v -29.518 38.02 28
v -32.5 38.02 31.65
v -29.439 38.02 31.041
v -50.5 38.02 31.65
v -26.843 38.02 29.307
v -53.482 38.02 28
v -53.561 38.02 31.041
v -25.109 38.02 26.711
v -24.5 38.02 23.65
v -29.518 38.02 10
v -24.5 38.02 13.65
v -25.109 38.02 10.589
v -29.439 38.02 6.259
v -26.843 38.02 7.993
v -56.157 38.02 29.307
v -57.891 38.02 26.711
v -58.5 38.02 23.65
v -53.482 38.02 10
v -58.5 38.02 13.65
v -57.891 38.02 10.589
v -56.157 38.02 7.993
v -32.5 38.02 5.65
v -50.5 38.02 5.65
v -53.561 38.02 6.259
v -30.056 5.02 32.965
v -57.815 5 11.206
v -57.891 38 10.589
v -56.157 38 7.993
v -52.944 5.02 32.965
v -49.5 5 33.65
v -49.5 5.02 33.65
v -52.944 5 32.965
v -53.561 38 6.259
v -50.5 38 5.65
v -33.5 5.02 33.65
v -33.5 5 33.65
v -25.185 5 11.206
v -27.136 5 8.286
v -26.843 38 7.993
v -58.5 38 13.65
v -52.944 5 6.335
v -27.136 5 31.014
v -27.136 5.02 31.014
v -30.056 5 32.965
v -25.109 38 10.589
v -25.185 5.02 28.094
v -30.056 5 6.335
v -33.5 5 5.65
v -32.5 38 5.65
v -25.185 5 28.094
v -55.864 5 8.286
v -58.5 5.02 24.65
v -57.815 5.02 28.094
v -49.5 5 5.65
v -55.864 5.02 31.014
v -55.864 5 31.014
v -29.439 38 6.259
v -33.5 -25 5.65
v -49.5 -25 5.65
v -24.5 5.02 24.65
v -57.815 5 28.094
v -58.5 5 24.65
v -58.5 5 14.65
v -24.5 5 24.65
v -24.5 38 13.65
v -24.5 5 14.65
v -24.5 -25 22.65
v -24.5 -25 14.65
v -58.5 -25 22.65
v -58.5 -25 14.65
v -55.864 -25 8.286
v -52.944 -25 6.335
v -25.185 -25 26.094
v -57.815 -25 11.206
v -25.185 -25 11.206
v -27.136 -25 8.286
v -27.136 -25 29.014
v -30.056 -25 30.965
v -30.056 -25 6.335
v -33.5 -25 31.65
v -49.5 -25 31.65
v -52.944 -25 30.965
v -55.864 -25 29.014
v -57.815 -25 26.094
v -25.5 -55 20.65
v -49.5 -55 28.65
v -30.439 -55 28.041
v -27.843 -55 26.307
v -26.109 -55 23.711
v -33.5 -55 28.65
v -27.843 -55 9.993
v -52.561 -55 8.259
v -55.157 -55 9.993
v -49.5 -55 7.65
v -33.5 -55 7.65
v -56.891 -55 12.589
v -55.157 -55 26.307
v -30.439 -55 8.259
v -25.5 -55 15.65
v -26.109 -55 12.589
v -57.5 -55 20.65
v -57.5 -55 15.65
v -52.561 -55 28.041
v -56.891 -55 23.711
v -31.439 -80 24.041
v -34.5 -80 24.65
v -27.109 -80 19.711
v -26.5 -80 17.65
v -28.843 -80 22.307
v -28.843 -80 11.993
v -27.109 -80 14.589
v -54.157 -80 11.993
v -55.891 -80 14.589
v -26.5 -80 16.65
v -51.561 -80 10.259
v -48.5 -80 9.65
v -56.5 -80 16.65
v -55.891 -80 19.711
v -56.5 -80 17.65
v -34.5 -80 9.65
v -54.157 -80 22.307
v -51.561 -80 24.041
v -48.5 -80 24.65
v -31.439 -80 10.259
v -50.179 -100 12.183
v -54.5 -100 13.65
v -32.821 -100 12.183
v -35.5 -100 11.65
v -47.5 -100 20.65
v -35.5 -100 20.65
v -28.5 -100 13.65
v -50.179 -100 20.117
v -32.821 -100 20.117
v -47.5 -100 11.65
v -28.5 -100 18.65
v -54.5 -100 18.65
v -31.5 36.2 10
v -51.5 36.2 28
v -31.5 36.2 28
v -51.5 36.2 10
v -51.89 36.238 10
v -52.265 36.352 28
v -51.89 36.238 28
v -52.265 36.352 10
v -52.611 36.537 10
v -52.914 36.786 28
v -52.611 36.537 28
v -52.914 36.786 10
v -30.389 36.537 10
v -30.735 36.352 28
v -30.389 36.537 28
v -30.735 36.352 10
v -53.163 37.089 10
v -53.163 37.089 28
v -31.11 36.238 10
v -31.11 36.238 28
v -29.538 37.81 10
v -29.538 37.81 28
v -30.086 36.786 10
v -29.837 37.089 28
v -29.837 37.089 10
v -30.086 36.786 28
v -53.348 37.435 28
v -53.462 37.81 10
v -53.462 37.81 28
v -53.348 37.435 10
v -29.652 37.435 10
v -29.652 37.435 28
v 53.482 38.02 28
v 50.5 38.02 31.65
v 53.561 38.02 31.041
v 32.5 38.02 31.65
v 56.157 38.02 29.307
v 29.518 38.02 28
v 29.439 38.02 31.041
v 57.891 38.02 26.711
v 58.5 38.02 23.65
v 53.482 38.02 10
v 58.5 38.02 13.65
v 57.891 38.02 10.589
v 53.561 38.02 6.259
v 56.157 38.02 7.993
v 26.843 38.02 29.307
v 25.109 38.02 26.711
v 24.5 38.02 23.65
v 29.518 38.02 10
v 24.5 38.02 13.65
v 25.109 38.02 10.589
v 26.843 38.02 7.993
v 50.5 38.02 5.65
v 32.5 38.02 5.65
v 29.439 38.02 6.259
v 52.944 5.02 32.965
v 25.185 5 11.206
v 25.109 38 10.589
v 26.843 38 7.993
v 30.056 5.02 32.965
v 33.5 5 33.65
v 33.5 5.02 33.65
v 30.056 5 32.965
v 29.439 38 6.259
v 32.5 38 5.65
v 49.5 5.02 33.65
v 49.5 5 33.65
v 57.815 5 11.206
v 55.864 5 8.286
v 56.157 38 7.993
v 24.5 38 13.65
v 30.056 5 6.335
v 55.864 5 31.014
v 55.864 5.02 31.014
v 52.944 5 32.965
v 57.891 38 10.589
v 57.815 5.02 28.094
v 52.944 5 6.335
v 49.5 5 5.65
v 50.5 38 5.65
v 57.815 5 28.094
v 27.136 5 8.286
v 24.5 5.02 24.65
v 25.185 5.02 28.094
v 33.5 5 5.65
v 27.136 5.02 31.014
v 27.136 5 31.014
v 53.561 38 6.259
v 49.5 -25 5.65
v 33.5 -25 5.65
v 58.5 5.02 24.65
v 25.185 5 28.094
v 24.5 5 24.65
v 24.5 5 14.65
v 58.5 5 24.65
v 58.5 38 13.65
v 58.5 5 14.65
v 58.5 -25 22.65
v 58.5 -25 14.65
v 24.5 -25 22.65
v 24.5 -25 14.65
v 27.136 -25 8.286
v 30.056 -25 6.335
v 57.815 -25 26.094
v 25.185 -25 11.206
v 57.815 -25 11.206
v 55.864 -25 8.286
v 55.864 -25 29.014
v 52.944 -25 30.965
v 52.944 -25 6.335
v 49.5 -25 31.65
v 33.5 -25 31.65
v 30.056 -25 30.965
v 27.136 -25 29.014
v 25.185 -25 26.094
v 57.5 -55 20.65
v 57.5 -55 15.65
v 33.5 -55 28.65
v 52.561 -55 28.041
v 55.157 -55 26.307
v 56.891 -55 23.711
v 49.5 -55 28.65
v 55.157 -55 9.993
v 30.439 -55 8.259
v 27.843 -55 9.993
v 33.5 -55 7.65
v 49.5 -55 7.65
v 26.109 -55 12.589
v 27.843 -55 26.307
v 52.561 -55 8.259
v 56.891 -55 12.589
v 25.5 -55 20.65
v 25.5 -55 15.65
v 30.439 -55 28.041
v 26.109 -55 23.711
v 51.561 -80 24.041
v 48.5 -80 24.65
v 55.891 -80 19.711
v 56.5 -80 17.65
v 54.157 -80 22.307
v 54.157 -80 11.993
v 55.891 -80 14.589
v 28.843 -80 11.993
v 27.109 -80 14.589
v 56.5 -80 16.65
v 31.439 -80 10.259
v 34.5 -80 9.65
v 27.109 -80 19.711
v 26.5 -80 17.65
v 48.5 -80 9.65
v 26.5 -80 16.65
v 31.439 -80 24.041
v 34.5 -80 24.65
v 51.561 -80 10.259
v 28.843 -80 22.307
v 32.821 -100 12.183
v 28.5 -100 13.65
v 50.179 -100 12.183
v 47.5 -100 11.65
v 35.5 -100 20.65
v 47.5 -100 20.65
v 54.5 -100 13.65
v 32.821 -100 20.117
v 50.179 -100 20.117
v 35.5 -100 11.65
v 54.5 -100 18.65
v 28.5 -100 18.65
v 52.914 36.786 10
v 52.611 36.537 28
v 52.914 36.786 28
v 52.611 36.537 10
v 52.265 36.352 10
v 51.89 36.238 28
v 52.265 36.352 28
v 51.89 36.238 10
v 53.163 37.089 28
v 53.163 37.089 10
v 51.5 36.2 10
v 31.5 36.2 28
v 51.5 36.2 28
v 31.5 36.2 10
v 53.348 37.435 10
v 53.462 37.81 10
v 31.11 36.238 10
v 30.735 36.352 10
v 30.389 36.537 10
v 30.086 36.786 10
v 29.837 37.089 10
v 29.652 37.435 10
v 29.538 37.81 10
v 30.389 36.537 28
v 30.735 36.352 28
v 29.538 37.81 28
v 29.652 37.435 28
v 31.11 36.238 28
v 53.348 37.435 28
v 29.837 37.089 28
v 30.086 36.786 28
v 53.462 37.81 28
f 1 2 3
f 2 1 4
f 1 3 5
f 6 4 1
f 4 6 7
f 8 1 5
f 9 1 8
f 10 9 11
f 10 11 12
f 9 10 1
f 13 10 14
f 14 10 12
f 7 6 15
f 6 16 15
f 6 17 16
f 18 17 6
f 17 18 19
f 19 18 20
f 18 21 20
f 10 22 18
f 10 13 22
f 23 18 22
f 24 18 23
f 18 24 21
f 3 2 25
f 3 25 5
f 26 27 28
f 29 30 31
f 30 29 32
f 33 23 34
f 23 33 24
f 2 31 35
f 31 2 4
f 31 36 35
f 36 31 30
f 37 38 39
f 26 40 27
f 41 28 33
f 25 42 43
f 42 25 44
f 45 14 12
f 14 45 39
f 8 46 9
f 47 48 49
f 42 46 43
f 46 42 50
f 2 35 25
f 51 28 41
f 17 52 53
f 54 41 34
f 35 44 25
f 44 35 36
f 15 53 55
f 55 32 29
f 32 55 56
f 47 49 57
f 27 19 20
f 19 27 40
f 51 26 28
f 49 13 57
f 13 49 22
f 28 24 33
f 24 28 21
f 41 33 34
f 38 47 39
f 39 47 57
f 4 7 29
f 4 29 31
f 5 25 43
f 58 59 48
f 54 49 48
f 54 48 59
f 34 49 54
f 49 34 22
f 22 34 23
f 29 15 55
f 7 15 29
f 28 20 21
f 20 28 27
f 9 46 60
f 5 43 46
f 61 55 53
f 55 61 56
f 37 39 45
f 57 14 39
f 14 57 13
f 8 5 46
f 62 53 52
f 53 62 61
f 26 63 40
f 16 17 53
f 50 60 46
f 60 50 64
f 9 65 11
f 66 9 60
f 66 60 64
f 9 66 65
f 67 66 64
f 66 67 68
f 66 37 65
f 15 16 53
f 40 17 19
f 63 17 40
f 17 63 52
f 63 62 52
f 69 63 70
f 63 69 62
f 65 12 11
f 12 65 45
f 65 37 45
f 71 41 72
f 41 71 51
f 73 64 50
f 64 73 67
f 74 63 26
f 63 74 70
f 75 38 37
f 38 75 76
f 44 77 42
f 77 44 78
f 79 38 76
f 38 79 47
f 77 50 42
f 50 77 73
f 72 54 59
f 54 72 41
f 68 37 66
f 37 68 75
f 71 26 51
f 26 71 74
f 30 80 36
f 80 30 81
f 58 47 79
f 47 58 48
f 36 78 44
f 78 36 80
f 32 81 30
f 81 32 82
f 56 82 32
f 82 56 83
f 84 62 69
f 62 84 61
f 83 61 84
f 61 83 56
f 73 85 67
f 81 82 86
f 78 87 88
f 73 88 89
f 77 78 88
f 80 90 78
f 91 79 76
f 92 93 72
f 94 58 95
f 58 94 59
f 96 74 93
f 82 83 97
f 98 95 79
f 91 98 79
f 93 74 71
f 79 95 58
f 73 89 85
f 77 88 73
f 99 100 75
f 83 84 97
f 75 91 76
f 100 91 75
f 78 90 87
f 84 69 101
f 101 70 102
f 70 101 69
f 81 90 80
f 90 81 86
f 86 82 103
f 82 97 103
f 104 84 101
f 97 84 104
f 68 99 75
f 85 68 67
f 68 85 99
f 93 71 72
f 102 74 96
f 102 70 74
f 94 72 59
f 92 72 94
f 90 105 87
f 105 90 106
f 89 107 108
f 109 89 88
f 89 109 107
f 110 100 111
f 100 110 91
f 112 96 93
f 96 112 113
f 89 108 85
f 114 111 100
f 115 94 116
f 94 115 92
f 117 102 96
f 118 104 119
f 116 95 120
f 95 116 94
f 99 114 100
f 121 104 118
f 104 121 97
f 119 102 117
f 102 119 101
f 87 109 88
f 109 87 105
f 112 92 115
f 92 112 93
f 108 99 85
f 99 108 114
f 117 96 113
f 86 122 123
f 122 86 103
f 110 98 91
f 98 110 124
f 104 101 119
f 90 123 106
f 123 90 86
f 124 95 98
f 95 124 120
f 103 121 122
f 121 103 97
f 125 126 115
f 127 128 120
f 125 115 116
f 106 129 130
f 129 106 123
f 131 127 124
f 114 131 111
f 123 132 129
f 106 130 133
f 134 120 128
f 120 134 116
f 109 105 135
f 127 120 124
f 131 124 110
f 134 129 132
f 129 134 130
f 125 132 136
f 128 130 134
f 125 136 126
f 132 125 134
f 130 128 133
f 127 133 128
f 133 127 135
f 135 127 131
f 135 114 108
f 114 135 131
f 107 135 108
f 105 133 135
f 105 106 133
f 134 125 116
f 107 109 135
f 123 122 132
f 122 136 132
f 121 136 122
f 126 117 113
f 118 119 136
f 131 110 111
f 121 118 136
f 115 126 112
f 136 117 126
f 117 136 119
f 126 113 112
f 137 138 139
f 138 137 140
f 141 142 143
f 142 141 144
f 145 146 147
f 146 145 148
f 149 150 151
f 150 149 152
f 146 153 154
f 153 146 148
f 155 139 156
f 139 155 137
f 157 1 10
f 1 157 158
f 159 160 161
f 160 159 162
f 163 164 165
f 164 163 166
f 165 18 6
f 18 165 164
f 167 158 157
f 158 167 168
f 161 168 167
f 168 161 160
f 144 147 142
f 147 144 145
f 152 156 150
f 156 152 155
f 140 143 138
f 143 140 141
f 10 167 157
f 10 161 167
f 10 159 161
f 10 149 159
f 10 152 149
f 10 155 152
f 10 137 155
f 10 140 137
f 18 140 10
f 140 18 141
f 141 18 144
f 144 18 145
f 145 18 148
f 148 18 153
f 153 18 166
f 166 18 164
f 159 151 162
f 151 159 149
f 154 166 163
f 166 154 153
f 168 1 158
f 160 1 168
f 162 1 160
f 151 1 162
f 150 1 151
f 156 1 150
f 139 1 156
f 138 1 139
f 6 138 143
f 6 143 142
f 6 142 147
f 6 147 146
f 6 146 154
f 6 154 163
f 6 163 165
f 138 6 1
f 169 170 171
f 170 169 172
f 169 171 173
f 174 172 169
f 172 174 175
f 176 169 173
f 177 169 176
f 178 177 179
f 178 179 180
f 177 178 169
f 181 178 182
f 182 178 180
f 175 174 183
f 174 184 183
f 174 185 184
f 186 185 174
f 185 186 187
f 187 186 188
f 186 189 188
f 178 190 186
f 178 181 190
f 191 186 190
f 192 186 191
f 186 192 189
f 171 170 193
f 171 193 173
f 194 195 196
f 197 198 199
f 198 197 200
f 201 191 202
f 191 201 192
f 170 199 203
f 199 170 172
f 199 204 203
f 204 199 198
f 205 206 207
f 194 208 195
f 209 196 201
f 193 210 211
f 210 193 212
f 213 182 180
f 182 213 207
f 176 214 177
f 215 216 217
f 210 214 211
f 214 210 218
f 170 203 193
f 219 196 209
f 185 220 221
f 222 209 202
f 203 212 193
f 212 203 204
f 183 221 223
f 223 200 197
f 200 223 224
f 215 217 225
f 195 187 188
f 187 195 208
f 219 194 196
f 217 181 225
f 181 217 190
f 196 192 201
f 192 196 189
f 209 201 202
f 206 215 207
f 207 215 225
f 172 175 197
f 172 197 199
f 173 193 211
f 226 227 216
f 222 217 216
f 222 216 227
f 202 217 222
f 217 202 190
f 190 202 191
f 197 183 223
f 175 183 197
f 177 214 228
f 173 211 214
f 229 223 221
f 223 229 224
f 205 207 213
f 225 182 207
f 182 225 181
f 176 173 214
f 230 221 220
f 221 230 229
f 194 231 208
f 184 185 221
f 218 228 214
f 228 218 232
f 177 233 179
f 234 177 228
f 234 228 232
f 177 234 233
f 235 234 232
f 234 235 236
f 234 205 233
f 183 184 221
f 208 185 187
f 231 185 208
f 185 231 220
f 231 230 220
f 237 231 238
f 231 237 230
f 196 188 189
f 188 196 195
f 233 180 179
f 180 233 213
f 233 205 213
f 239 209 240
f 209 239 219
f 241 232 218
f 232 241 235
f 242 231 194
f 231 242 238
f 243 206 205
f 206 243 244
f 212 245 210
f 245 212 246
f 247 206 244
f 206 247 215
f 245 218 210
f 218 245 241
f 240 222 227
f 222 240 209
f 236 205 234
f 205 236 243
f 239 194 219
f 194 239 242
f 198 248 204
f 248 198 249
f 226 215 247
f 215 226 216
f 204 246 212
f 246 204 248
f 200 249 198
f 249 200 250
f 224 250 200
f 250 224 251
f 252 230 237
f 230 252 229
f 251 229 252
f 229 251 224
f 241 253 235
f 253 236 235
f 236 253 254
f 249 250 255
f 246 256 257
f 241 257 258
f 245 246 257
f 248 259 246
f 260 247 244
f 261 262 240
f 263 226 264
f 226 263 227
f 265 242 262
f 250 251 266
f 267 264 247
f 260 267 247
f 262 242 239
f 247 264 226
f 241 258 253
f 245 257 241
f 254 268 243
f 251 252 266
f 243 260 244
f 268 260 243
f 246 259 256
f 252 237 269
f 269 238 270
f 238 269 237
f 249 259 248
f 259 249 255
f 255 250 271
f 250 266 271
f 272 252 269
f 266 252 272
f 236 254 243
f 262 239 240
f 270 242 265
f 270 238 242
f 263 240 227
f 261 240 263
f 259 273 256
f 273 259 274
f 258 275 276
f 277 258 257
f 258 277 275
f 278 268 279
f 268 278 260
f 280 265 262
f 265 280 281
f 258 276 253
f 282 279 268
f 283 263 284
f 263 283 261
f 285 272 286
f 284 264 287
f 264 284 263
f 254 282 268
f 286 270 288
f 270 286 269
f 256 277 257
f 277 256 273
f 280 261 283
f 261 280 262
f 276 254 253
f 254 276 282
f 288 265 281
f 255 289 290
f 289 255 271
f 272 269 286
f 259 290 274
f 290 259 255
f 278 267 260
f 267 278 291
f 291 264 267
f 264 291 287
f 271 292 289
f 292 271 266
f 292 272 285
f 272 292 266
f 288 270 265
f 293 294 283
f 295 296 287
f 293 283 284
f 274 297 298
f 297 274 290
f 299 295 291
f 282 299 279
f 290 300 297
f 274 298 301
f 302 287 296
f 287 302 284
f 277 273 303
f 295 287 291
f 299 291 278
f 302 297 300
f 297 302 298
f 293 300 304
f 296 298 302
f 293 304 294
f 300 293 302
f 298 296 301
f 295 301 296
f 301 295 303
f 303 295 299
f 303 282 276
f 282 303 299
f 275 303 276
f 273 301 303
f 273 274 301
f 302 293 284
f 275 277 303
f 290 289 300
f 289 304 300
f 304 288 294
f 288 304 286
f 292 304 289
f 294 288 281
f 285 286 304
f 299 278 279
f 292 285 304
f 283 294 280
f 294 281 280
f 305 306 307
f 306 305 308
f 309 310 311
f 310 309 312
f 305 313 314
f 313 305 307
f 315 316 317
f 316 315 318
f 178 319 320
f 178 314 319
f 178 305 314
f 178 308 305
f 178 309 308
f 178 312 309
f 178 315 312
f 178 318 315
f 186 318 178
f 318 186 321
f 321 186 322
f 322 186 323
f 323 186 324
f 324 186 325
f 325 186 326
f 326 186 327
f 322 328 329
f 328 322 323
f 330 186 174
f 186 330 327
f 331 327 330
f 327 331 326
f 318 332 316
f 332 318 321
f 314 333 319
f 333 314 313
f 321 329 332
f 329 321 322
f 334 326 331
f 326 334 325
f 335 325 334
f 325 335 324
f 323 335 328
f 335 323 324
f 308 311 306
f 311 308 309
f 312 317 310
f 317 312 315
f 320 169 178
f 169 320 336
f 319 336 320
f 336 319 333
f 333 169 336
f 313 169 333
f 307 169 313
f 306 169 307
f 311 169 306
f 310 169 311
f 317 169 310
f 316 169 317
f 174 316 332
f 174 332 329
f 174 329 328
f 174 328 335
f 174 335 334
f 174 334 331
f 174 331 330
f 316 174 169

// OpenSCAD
// file: ../lib.scad
// ===== 공용 프리미티브 (params 의존 없음 — use로 포함. 함정 1) =====

// 두 점을 잇는 캡슐. 끝단이 od/2 만큼 뻗는다 (함정 3)
module rod(p1, p2, od, fn = 56)
    hull() { translate(p1) sphere(d = od, $fn = fn);
             translate(p2) sphere(d = od, $fn = fn); }

function mir(p, s = 1) = [s * p.x, p.y, p.z];

// --- 라운디드 사각 2D 폴리곤 (CCW) ---
function arc_pt(cx, cy, r, a) = [cx + r * cos(a), cy + r * sin(a)];
function rrpts(w, h, r, n = 4) =
    let (x = w / 2 - r, y = h / 2 - r)
    concat(
        [for (i = [0:n]) arc_pt( x, -y, r, -90 + 90 * i / n)],
        [for (i = [0:n]) arc_pt( x,  y, r,   0 + 90 * i / n)],
        [for (i = [0:n]) arc_pt(-x,  y, r,  90 + 90 * i / n)],
        [for (i = [0:n]) arc_pt(-x, -y, r, 180 + 90 * i / n)]);

// y 위치의 XZ 단면 슬래브 (중심 x0/zc, 폭 w/높이 h, 모서리 r).
// 회전 매핑: 2D x→차량 X, 2D y→차량 Z, 돌출 +z→−Y (y..y+0.02 전방 전용, 함정 20)
module slabr(y, x0, w, h, zc, r)
    translate([x0, y + 0.02, zc]) rotate([90, 0, 0])
        linear_extrude(0.02) polygon(rrpts(w, h, r));

// 단면 체인 loft: sec = [[y, x0, w, h, zc, r], ...]
module loftr(sec)
    for (i = [0 : len(sec) - 2])
        hull() {
            slabr(sec[i][0],     sec[i][1],     sec[i][2],     sec[i][3],     sec[i][4],     sec[i][5]);
            slabr(sec[i + 1][0], sec[i + 1][1], sec[i + 1][2], sec[i + 1][3], sec[i + 1][4], sec[i + 1][5]);
        }

// 라운디드 박스 (z0..z1 수직, 평면 모서리 r)
module rbox(xc, yc, z0, z1, dx, dy, r, fn = 32)
    hull() for (px = [-1, 1], py = [-1, 1])
        translate([xc + px * (dx / 2 - r), yc + py * (dy / 2 - r), z0])
            cylinder(r = r, h = z1 - z0, $fn = fn);

// --- NACA 계열 에어포일 (LE 원점, 2D +x = 현 방향) ---
function _yt(x, c, t) = 5 * t * c * (0.2969*sqrt(x) - 0.1260*x - 0.3516*x*x
    + 0.2843*x*x*x - 0.1036*x*x*x*x);
function _yc(x, c, m) = 4 * m * c * x * (1 - x);
function naca_pts(c, t, m, n = 12) =
    concat(
        [for (i = [0:n])     let (x = i / n)     [x*c,  _yt(x, c, t) + _yc(x, c, m)]],
        [for (i = [n-1:-1:0]) let (x = i / n)    [x*c, -_yt(x, c, t) + _yc(x, c, m)]]);

// 슬라이스 3D 링: v=[x, yle, zle, c, aoa, th, cam] → 받각 회전된 naca 점의 링
// (th/cam은 mm — 현 대비 비율로 정규화)
function wring(v, n = 12) =
    let (c = v[3], t = v[5] / c, m = v[6] / c, pts = naca_pts(c, t, m, n),
         ca = cos(v[4]), sa = sin(v[4]))
    // 코드 방향 (ca,sa) + 두께/캠버 수직 방향 (-sa,ca) — 2D y 누락 금지
    [for (p = pts) [v[0], v[1] + p[0] * ca - p[1] * sa, v[2] + p[0] * sa + p[1] * ca]];

// 진짜 로프트 윙 — polyhedron 스트립. hull 체인은 캠버진 하면을 볼록 껍질로
// 채워(LE→TE 직선 웨지) 요소가 처지므로 쓰지 않는다
module wing3(sl, n = 12) {
    rings = [for (v = sl) wring(v, n)];
    ns = len(rings);
    m = len(rings[0]);
    pts = [for (r = rings, p = r) p];
    function ix(i, k) = i * m + (k % m);
    faces = concat(
        // 측면 스트립 (사중면 → 삼각형 2) — 외향 노멀 권선(캡과 일치)
        [for (i = [0 : ns - 2], k = [0 : m - 1])
            each [[ix(i, k), ix(i, k + 1), ix(i + 1, k + 1)],
                  [ix(i, k), ix(i + 1, k + 1), ix(i + 1, k)]]],
        // 끝 캡 (링은 단순 폴리곤 — 팬 삼각분할)
        [for (k = [1 : m - 2]) [ix(0, 0), ix(0, k + 1), ix(0, k)]],
        [for (k = [1 : m - 2]) [ix(ns - 1, 0), ix(ns - 1, k), ix(ns - 1, k + 1)]]
    );
    polyhedron(points = pts, faces = faces, convexity = 4);
}

// 반쪽 슬라이스 → x-대칭 전체. 규약: half는 센터(x=0)→팁 순서(내림차순 x).
// 결과는 x 오름차순 체인. x=0 센터만 중복 제외 (그 외 전부 미러)
function wsym(half) =
    concat([for (i = [len(half) - 1 : -1 : 0]) half[i]],
           [for (i = [0 : len(half) - 1]) if (abs(half[i][0]) > 1e-9)
               concat([-half[i][0]], [for (j = [1 : len(half[i]) - 1]) half[i][j]])]);

// 환(링), 축 Z
module ann(r_in, r_out, h, fn = 96)
    difference() { cylinder(r = r_out, h = h, center = true, $fn = fn);
                   cylinder(r = r_in,  h = h + 2, center = true, $fn = fn); }

// 리스트 전체 x반전+순서 역행 (센터 구간 없는 플랩 등 — 좌우 별도 wing3 호출용).
// x반전만 하면 행렬식이 음수가 되어 권선이 뒤집힌다 → 순서 역행으로 상쇄
function msym(half) =
    [for (i = [len(half) - 1 : -1 : 0])
        concat([-half[i][0]], [for (j = [1 : len(half[i]) - 1]) half[i][j]])];
// file: ../params.scad
// =====================================================================
// F1 그랜드파이언스 카 1:10 — 전체 파라미터 (유일한 수정 지점)
// 좌표계: +Y 전방, +X 좌측, +Z 상방, 지면 z=0, 원점=휠베이스 중심
// 전장 558 (y -268..+278), 전폭 194, 휠베이스 360, 타이어 OD 72 (720mm)
// 30부품. loftr 단면 = [y, x0, w, h, zc, r] (XZ 단면, y..y+0.02 슬래브)
// wing3 슬라이스 = [x, yle, zle, c, aoa, th, cam]
//   aoa: 현 방향의 X축 회전각. 전방 받각 요소는 165~170 (TE가 뒤+위)
// =====================================================================
$fn = 96;

// -- 휠/액슬 (실차 720mm 타이어, 18인치 림, 트랙 F1600/R1550) --
AXF_Y = 180;   AXR_Y = -180;
WHF_X = 80;    WHR_X = 77.5;
WH_Z  = 36;
TIRF_W = 30.5; TIRR_W = 40.5;  TIR_R = 36;
TIR_FN = 288;                 // 타이어 회전체 해상도
RIM_R = 23.2;  RIM_T = 1.0;   // 림 배럴 반경/두께
RIM_LF = 12.4; RIM_LR = 17.4; // 림 배럴 반폭
HUB_BORE = 7.0; STUB_D = 6.2; // 방사 간극 0.4
DISC_R = 15.5;                // 브레이크 디스크

// -- 바디 공통 레벨 --
FLO_Z0 = 2.0;  FLO_Z1 = 5.5;  // 플로어 (두께 3.5)
BOD_Z0 = 5.65;                // 샤시/카버/기어박스 바닥 (플로어 위 0.15)
J = 0.15;                     // 부품 접합 기본 간극
ARM_OD = 3.4;                 // 서스펜션 암 캡슐 직경

// ===== 01 플로어 =====
FLOOR_SEC = [
    [132,    0,  92, 3.5, 3.75, 1.5], [100, 0, 118, 3.5, 3.75, 1.5],
    [60,     0, 130, 3.5, 3.75, 2.0], [10,  0, 132, 3.5, 3.75, 2.0],
    [-60,    0, 128, 3.5, 3.75, 2.0], [-120, 0, 112, 3.5, 3.75, 2.0],
    [-161.85, 0, 100, 3.5, 3.75, 2.0]];

// ===== 02 디퓨저 (램프 + 스트레이크는 부품 내부) =====
DIFF_SEC = [
    [-230,   0, 100, 10.0, 11.0, 1.5], [-215, 0, 100, 8.0,  9.0, 1.5],
    [-190,   0, 100,  6.0,  6.2, 1.5], [-162.0, 0, 100, 4.0, 4.15, 1.5]];
DIFF_TOP = [[-175, 7.8], [-205, 11.9], [-228, 15.6]];  // (y, 램프 상면 z)

// ===== 03 플로어 에지 윙 =====
FEW_SEC = [   // [y, x0, w, h, zc, r] — x0 부호로 좌우
    [55,   63.5, 3.0, 2.0, 6.65, 1.0], [-5,  65.5, 3.0, 5.5, 8.40, 1.5],
    [-70,  63.0, 3.0, 4.0, 7.65, 1.5], [-120, 58.0, 3.0, 3.0, 7.15, 1.5]];
FEW2_SEC = [
    [100, 57.0, 2.5, 1.5, 6.40, 0.8], [60, 60.0, 2.5, 2.0, 6.65, 0.8]];

// ===== 04 노우즈 =====
NOSE_SEC = [
    [95,   0, 38, 28, 25.3, 12], [100,  0, 38, 29, 25.3, 12],
    [115,  0, 36, 28, 23.8, 11], [135,  0, 31, 24, 21.3,  9],
    [160,  0, 27, 20, 18.3,  8], [185,  0, 23, 17, 15.8,  7],
    [205,  0, 20, 15, 14.3,  6], [224,  0, 17, 12, 12.3,  5],
    [242,  0, 14,  9, 10.8,  4], [258,  0, 10,  7, 10.1,  3],
    [272,  0,  4.5, 4.5, 9.8, 2], [273.5, 0, 1.2, 1.2, 9.8, 0.6]];

// ===== 05 샤시(모노코크) + 콕핏 컷 =====
CHAS_SEC = [
    [-34.85, 0, 46, 44, 27.65, 15], [-10, 0, 48, 46, 28.65, 15],
    [20,     0, 48, 44, 27.65, 15], [60,  0, 46, 40, 25.65, 14],
    [94.85,  0, 42, 34, 22.65, 12]];
CKP_CUT = [[62, 0, 34, 32, 46, 3], [-30, 0, 34, 30, 45, 3]];

// ===== 06 엔진 커버 + 샤크핀 =====
COV_SEC = [
    [-152,   0,  8, 14, 35.65,  6], [-140, 0, 12, 18, 32.65,  7],
    [-120,   0, 18, 24, 29.65,  9], [-95,  0, 26, 30, 26.15, 11],
    [-70,    0, 34, 36, 25.65, 13], [-50,  0, 40, 40, 25.65, 14],
    [-35.15, 0, 44, 42, 26.65, 15]];
FIN_SEC = [
    [-162, 0, 2.2, 44, 62.0, 1], [-120, 0, 2.5, 30, 56.0, 1],
    [-92.2, 0, 2.5, 10, 45.0, 1]];

// ===== 07 에어박스 (험프 + 인테이크 링) =====
ABX_SEC = [
    [-92, 0, 14, 17, 50.00, 6], [-68, 0, 20, 24, 56.60, 8],
    [-46, 0, 22, 26, 59.60, 8], [-34, 0, 22, 13, 56.30, 6]];
ABX_RING_C = [0, -45, 73.5];  ABX_RING_R = 11;  ABX_RING_T = 4.5;
ABX_RING_SZ = 0.72;

// ===== 08 사이드포드 (x0=±41.5) =====
SPOD_X0 = 41.5;
SPOD_SEC = [   // [y, w, h, zc, r]
    [38,   34, 26, 18.65, 8], [5,   34, 28, 19.65, 9], [-25,  34, 26, 18.65, 9],
    [-55,  32, 21, 18.15, 8], [-80, 30, 15, 17.15, 8], [-100, 26,  9, 16.15, 7]];
SPOD_INLET = [24, 18, 19, 2.3];  // 컷: w, h, zc, 깊이

// ===== 09 할로 =====
HALO_N = 28;  HALO_OD = 9;
HALO_RX = 22; HALO_RY = 44; HALO_CY = 12;  // 타원 계획면(평면도)
HALO_Z0 = 75; HALO_ZA = 2;                 // z(t) = Z0 + ZA*cos(t)

// ===== 10/11/12/13 프런트 윙 =====
FW_MAIN_HALF = [   // 반쪽(x≤0) — wsym()로 전체화
    [0,    258.3, 2.4, 20, 170, 1.4, 2.0],
    [-16,  259.0, 3.4, 27, 165, 1.6, 2.4],
    [-40,  260.0, 3.6, 40, 166, 1.8, 2.8],
    [-60,  257.0, 4.0, 37, 167, 1.7, 2.6],
    [-80,  258.0, 4.4, 31, 166, 1.6, 2.2],
    [-95.2, 263.0, 4.6, 26, 166, 1.5, 1.8]];
FW_F1_HALF = [
    [-16,  253.0, 8.0, 22, 155, 1.3, 4.0],
    [-40,  250.5, 8.2, 26, 156, 1.4, 4.2],
    [-60,  249.5, 8.4, 26, 157, 1.4, 4.2],
    [-80,  250.0, 8.6, 24, 158, 1.4, 4.0],
    [-95.2, 254.0, 8.8, 21, 158, 1.3, 3.5]];
FW_F2_HALF = [
    [-16,  258.0, 12.4, 17, 147, 1.2, 4.5],
    [-40,  255.5, 12.6, 20, 148, 1.3, 4.8],
    [-60,  254.5, 12.8, 20, 149, 1.3, 4.8],
    [-80,  254.5, 13.0, 19, 150, 1.3, 4.5],
    [-95.2, 258.0, 13.2, 17, 150, 1.2, 4.0]];
FW_EP_X = 96.3;  FW_EP_T = 1.5;   // 엔드플레이트 x 중심/두께
FW_EP_PTS = [    // (y,z) 아웃라인
    [226, 1.5], [266, 1.5], [266, 8], [263, 24.5], [252, 24.5],
    [244, 17], [233, 15], [226, 9]];
FW_MT_SEC = [   // 마운트 플레이트 [y, x0(±2.6), w, h, zc, r] — 노우즈 저면 라운딩 회피
    [244, 2.6, 1.6, 1.8, 5.25, 0.5], [250, 2.6, 1.6, 1.8, 5.25, 0.5]];

// ===== 14 리어 윙 =====
RW_MAIN = [
    [-50.8, -212, 57.5, 46, 162, 2.2, -3.5], [-25, -211, 56.6, 47, 162, 2.3, -4.0],
    [0,     -210, 54.2, 47, 162, 2.3, -4.0], [25,  -211, 56.6, 47, 162, 2.3, -4.0],
    [50.8,  -212, 57.5, 46, 162, 2.2, -3.5]];
RW_FLAP = [
    [-49.6, -234,   71.8, 30, 155, 1.8, -4.5],
    [0,     -235.5, 73.0, 30, 155, 1.8, -4.5],
    [49.6,  -234,   71.8, 30, 155, 1.8, -4.5]];
RW_EP_X = 52;  RW_EP_T = 2;
RW_EP_PTS = [
    [-200, 46], [-268, 46], [-268, 60], [-262, 93], [-250, 93],
    [-243, 72], [-218, 64], [-202, 74]];
RW_DRS = [-245, 79.4, 5.0, 2.6, 3.0];   // 팟: y, z, w, h, 두께

// ===== 15 빔 윙 =====
BEAM_E1 = [
    [-50.9, -204.5, 31.5, 16, 162, 1.8, -2.5], [0, -205.5, 30.4, 16, 162, 1.8, -2.5],
    [50.9,  -204.5, 31.5, 16, 162, 1.8, -2.5]];
BEAM_E2 = [
    [-50.9, -210, 36.8, 15, 158, 1.6, -3.0], [0, -211, 35.6, 15, 158, 1.6, -3.0],
    [50.9,  -210, 36.8, 15, 158, 1.6, -3.0]];
BEAM_PLATE = [-214, -200.15, 8.2, 22, 31];  // 마운트 플레이트 y1,y0,x반폭,z0,z1

// ===== 16 리어윙 파일론(쌍둥 스완넥) =====
RW_PYL = [[-158, 55.0], [-190, 58.0], [-212.5, 63.0]];  // (y, z), x=±5.4
RW_PYL_X = 5.4;  RW_PYL_OD = 8;

// ===== 17 미러 =====
MIR_BASE = [14, 63, 46.0];  MIR_HOUSE = [31, 66, 56.5];

// ===== 18 헬멧 =====
HELM_C = [0, 0, 55];  HELM_R = 11.5;
HELM_SC = [1, 1.18, 1.02];

// ===== 19 콕핏 트림 =====
SEAT_SEC  = [[30, 0, 26, 13.2, 36.75, 3], [-10, 0, 26, 13.2, 36.75, 3]];
HREST_SEC = [[12, 0, 32, 15, 53.5, 5], [-20, 0, 32, 15, 53.5, 5]];

// ===== 20 스티어링 휠 =====
SW_C = [0, 40, 47];  SW_TILT = 20;

// ===== 21/22 서스펜션 (픽업=[x, y, z], 암 끝은 업라이트 내부) =====
FUP = [61, 183, 46];  FLO_BALL = [61.5, 181, 24];  FTR = [61.5, 177, 35];
FPU = [61.5, 180, 27];
F_ARM = [   // [픽업, 볼]
    [[12.0, 206, 20.0], FUP],  [[16.0, 152, 23.0], FUP],
    [[11.9, 208,  9.3], FLO_BALL], [[16.3, 150, 12.0], FLO_BALL],
    [[15.6, 162, 14.0], FTR]];
F_PUSH = [[11.8, 198, 24.4], FPU];
RUP = [53.5, -182, 46];  RLO = [54, -179, 23];  RDRIVE_O = [52, -180, 31];
R_ARM = [
    [[13.3, -160, 47.0], RUP], [[13.3, -198, 45.0], RUP],
    [[12.8, -158, 20.4], RLO], [[9.2, -202, 19.6], RLO]];
R_PULL = [[12.6, -177, 23.75], [53.5, -181, 44]];
R_DRIVE = [[13.2, -180, 17.0], RDRIVE_O];

// ===== 23/24 브레이크 스쿱 =====
SCOOP_F = [[164.2, 59.5, 7, 11, 30, 3], [158, 58.5, 5.5, 8, 28.5, 2.5]];
SCOOP_R = [[-164.2, 48, 7, 10, 29, 3], [-158, 46, 5, 7.5, 27.5, 2.5]];

// ===== 25~28 타이어/림 =====
TIRE_BEAD = 2.6;   // 비드 안쪽 세팅 (단면 반경 23.4)

// ===== 29 기어박스 + 리어 크래시 =====
GEAR_SEC = [
    [-258,   0,  4,  1.8, 15.00, 1.5], [-252, 0,  6,  1.6, 16.30, 2],
    [-230,   0,  9,  1.4, 18.30, 3],   [-208, 0, 12,  4.9, 15.05, 4],
    [-195,   0, 16,  9.35, 14.83, 5],   [-170, 0, 20, 15.1, 15.45, 6],
    [-145,   0, 22, 15.95, 13.60, 7],  [-117.85, 0, 26, 8.6,  9.95, 8]];
GEAR_TOWER = [-200, -158, 8, 11.3, 28, 50];  // y1,y0,x내측,x외측,z0,z1
RAIN_LT = [-258.6, 5, 4];   // y면, w, h

// ===== 30 카메라/안테나 =====
TCAM_Y = -45;  TCAM_Z0 = 84.8;
SIDECAM = [[194, 19.0], [202, 18.5]];  // (y, z) — x는 노우즈 반폭+0.15
ANT = [[4, 70], [-4, 70]];             // (x, y) — chassis 탑
// main file
// 08 사이드포드 — 다운워시 램프 테이퍼 + 인렛 리세스 (좌우 1부품)
include <../params.scad>
use <../lib.scad>

module sidepod()
for (s = [-1, 1])
    difference() {
        loftr([for (r = SPOD_SEC) [r[0], s * SPOD_X0, r[1], r[2], r[3], r[4]]]);
        // 인렛 리세스 (전면 2.3mm 깊이)
        rbox(s * SPOD_X0, 39.05, 10, 28, SPOD_INLET[0], SPOD_INLET[3], 2);
    }

sidepod();
